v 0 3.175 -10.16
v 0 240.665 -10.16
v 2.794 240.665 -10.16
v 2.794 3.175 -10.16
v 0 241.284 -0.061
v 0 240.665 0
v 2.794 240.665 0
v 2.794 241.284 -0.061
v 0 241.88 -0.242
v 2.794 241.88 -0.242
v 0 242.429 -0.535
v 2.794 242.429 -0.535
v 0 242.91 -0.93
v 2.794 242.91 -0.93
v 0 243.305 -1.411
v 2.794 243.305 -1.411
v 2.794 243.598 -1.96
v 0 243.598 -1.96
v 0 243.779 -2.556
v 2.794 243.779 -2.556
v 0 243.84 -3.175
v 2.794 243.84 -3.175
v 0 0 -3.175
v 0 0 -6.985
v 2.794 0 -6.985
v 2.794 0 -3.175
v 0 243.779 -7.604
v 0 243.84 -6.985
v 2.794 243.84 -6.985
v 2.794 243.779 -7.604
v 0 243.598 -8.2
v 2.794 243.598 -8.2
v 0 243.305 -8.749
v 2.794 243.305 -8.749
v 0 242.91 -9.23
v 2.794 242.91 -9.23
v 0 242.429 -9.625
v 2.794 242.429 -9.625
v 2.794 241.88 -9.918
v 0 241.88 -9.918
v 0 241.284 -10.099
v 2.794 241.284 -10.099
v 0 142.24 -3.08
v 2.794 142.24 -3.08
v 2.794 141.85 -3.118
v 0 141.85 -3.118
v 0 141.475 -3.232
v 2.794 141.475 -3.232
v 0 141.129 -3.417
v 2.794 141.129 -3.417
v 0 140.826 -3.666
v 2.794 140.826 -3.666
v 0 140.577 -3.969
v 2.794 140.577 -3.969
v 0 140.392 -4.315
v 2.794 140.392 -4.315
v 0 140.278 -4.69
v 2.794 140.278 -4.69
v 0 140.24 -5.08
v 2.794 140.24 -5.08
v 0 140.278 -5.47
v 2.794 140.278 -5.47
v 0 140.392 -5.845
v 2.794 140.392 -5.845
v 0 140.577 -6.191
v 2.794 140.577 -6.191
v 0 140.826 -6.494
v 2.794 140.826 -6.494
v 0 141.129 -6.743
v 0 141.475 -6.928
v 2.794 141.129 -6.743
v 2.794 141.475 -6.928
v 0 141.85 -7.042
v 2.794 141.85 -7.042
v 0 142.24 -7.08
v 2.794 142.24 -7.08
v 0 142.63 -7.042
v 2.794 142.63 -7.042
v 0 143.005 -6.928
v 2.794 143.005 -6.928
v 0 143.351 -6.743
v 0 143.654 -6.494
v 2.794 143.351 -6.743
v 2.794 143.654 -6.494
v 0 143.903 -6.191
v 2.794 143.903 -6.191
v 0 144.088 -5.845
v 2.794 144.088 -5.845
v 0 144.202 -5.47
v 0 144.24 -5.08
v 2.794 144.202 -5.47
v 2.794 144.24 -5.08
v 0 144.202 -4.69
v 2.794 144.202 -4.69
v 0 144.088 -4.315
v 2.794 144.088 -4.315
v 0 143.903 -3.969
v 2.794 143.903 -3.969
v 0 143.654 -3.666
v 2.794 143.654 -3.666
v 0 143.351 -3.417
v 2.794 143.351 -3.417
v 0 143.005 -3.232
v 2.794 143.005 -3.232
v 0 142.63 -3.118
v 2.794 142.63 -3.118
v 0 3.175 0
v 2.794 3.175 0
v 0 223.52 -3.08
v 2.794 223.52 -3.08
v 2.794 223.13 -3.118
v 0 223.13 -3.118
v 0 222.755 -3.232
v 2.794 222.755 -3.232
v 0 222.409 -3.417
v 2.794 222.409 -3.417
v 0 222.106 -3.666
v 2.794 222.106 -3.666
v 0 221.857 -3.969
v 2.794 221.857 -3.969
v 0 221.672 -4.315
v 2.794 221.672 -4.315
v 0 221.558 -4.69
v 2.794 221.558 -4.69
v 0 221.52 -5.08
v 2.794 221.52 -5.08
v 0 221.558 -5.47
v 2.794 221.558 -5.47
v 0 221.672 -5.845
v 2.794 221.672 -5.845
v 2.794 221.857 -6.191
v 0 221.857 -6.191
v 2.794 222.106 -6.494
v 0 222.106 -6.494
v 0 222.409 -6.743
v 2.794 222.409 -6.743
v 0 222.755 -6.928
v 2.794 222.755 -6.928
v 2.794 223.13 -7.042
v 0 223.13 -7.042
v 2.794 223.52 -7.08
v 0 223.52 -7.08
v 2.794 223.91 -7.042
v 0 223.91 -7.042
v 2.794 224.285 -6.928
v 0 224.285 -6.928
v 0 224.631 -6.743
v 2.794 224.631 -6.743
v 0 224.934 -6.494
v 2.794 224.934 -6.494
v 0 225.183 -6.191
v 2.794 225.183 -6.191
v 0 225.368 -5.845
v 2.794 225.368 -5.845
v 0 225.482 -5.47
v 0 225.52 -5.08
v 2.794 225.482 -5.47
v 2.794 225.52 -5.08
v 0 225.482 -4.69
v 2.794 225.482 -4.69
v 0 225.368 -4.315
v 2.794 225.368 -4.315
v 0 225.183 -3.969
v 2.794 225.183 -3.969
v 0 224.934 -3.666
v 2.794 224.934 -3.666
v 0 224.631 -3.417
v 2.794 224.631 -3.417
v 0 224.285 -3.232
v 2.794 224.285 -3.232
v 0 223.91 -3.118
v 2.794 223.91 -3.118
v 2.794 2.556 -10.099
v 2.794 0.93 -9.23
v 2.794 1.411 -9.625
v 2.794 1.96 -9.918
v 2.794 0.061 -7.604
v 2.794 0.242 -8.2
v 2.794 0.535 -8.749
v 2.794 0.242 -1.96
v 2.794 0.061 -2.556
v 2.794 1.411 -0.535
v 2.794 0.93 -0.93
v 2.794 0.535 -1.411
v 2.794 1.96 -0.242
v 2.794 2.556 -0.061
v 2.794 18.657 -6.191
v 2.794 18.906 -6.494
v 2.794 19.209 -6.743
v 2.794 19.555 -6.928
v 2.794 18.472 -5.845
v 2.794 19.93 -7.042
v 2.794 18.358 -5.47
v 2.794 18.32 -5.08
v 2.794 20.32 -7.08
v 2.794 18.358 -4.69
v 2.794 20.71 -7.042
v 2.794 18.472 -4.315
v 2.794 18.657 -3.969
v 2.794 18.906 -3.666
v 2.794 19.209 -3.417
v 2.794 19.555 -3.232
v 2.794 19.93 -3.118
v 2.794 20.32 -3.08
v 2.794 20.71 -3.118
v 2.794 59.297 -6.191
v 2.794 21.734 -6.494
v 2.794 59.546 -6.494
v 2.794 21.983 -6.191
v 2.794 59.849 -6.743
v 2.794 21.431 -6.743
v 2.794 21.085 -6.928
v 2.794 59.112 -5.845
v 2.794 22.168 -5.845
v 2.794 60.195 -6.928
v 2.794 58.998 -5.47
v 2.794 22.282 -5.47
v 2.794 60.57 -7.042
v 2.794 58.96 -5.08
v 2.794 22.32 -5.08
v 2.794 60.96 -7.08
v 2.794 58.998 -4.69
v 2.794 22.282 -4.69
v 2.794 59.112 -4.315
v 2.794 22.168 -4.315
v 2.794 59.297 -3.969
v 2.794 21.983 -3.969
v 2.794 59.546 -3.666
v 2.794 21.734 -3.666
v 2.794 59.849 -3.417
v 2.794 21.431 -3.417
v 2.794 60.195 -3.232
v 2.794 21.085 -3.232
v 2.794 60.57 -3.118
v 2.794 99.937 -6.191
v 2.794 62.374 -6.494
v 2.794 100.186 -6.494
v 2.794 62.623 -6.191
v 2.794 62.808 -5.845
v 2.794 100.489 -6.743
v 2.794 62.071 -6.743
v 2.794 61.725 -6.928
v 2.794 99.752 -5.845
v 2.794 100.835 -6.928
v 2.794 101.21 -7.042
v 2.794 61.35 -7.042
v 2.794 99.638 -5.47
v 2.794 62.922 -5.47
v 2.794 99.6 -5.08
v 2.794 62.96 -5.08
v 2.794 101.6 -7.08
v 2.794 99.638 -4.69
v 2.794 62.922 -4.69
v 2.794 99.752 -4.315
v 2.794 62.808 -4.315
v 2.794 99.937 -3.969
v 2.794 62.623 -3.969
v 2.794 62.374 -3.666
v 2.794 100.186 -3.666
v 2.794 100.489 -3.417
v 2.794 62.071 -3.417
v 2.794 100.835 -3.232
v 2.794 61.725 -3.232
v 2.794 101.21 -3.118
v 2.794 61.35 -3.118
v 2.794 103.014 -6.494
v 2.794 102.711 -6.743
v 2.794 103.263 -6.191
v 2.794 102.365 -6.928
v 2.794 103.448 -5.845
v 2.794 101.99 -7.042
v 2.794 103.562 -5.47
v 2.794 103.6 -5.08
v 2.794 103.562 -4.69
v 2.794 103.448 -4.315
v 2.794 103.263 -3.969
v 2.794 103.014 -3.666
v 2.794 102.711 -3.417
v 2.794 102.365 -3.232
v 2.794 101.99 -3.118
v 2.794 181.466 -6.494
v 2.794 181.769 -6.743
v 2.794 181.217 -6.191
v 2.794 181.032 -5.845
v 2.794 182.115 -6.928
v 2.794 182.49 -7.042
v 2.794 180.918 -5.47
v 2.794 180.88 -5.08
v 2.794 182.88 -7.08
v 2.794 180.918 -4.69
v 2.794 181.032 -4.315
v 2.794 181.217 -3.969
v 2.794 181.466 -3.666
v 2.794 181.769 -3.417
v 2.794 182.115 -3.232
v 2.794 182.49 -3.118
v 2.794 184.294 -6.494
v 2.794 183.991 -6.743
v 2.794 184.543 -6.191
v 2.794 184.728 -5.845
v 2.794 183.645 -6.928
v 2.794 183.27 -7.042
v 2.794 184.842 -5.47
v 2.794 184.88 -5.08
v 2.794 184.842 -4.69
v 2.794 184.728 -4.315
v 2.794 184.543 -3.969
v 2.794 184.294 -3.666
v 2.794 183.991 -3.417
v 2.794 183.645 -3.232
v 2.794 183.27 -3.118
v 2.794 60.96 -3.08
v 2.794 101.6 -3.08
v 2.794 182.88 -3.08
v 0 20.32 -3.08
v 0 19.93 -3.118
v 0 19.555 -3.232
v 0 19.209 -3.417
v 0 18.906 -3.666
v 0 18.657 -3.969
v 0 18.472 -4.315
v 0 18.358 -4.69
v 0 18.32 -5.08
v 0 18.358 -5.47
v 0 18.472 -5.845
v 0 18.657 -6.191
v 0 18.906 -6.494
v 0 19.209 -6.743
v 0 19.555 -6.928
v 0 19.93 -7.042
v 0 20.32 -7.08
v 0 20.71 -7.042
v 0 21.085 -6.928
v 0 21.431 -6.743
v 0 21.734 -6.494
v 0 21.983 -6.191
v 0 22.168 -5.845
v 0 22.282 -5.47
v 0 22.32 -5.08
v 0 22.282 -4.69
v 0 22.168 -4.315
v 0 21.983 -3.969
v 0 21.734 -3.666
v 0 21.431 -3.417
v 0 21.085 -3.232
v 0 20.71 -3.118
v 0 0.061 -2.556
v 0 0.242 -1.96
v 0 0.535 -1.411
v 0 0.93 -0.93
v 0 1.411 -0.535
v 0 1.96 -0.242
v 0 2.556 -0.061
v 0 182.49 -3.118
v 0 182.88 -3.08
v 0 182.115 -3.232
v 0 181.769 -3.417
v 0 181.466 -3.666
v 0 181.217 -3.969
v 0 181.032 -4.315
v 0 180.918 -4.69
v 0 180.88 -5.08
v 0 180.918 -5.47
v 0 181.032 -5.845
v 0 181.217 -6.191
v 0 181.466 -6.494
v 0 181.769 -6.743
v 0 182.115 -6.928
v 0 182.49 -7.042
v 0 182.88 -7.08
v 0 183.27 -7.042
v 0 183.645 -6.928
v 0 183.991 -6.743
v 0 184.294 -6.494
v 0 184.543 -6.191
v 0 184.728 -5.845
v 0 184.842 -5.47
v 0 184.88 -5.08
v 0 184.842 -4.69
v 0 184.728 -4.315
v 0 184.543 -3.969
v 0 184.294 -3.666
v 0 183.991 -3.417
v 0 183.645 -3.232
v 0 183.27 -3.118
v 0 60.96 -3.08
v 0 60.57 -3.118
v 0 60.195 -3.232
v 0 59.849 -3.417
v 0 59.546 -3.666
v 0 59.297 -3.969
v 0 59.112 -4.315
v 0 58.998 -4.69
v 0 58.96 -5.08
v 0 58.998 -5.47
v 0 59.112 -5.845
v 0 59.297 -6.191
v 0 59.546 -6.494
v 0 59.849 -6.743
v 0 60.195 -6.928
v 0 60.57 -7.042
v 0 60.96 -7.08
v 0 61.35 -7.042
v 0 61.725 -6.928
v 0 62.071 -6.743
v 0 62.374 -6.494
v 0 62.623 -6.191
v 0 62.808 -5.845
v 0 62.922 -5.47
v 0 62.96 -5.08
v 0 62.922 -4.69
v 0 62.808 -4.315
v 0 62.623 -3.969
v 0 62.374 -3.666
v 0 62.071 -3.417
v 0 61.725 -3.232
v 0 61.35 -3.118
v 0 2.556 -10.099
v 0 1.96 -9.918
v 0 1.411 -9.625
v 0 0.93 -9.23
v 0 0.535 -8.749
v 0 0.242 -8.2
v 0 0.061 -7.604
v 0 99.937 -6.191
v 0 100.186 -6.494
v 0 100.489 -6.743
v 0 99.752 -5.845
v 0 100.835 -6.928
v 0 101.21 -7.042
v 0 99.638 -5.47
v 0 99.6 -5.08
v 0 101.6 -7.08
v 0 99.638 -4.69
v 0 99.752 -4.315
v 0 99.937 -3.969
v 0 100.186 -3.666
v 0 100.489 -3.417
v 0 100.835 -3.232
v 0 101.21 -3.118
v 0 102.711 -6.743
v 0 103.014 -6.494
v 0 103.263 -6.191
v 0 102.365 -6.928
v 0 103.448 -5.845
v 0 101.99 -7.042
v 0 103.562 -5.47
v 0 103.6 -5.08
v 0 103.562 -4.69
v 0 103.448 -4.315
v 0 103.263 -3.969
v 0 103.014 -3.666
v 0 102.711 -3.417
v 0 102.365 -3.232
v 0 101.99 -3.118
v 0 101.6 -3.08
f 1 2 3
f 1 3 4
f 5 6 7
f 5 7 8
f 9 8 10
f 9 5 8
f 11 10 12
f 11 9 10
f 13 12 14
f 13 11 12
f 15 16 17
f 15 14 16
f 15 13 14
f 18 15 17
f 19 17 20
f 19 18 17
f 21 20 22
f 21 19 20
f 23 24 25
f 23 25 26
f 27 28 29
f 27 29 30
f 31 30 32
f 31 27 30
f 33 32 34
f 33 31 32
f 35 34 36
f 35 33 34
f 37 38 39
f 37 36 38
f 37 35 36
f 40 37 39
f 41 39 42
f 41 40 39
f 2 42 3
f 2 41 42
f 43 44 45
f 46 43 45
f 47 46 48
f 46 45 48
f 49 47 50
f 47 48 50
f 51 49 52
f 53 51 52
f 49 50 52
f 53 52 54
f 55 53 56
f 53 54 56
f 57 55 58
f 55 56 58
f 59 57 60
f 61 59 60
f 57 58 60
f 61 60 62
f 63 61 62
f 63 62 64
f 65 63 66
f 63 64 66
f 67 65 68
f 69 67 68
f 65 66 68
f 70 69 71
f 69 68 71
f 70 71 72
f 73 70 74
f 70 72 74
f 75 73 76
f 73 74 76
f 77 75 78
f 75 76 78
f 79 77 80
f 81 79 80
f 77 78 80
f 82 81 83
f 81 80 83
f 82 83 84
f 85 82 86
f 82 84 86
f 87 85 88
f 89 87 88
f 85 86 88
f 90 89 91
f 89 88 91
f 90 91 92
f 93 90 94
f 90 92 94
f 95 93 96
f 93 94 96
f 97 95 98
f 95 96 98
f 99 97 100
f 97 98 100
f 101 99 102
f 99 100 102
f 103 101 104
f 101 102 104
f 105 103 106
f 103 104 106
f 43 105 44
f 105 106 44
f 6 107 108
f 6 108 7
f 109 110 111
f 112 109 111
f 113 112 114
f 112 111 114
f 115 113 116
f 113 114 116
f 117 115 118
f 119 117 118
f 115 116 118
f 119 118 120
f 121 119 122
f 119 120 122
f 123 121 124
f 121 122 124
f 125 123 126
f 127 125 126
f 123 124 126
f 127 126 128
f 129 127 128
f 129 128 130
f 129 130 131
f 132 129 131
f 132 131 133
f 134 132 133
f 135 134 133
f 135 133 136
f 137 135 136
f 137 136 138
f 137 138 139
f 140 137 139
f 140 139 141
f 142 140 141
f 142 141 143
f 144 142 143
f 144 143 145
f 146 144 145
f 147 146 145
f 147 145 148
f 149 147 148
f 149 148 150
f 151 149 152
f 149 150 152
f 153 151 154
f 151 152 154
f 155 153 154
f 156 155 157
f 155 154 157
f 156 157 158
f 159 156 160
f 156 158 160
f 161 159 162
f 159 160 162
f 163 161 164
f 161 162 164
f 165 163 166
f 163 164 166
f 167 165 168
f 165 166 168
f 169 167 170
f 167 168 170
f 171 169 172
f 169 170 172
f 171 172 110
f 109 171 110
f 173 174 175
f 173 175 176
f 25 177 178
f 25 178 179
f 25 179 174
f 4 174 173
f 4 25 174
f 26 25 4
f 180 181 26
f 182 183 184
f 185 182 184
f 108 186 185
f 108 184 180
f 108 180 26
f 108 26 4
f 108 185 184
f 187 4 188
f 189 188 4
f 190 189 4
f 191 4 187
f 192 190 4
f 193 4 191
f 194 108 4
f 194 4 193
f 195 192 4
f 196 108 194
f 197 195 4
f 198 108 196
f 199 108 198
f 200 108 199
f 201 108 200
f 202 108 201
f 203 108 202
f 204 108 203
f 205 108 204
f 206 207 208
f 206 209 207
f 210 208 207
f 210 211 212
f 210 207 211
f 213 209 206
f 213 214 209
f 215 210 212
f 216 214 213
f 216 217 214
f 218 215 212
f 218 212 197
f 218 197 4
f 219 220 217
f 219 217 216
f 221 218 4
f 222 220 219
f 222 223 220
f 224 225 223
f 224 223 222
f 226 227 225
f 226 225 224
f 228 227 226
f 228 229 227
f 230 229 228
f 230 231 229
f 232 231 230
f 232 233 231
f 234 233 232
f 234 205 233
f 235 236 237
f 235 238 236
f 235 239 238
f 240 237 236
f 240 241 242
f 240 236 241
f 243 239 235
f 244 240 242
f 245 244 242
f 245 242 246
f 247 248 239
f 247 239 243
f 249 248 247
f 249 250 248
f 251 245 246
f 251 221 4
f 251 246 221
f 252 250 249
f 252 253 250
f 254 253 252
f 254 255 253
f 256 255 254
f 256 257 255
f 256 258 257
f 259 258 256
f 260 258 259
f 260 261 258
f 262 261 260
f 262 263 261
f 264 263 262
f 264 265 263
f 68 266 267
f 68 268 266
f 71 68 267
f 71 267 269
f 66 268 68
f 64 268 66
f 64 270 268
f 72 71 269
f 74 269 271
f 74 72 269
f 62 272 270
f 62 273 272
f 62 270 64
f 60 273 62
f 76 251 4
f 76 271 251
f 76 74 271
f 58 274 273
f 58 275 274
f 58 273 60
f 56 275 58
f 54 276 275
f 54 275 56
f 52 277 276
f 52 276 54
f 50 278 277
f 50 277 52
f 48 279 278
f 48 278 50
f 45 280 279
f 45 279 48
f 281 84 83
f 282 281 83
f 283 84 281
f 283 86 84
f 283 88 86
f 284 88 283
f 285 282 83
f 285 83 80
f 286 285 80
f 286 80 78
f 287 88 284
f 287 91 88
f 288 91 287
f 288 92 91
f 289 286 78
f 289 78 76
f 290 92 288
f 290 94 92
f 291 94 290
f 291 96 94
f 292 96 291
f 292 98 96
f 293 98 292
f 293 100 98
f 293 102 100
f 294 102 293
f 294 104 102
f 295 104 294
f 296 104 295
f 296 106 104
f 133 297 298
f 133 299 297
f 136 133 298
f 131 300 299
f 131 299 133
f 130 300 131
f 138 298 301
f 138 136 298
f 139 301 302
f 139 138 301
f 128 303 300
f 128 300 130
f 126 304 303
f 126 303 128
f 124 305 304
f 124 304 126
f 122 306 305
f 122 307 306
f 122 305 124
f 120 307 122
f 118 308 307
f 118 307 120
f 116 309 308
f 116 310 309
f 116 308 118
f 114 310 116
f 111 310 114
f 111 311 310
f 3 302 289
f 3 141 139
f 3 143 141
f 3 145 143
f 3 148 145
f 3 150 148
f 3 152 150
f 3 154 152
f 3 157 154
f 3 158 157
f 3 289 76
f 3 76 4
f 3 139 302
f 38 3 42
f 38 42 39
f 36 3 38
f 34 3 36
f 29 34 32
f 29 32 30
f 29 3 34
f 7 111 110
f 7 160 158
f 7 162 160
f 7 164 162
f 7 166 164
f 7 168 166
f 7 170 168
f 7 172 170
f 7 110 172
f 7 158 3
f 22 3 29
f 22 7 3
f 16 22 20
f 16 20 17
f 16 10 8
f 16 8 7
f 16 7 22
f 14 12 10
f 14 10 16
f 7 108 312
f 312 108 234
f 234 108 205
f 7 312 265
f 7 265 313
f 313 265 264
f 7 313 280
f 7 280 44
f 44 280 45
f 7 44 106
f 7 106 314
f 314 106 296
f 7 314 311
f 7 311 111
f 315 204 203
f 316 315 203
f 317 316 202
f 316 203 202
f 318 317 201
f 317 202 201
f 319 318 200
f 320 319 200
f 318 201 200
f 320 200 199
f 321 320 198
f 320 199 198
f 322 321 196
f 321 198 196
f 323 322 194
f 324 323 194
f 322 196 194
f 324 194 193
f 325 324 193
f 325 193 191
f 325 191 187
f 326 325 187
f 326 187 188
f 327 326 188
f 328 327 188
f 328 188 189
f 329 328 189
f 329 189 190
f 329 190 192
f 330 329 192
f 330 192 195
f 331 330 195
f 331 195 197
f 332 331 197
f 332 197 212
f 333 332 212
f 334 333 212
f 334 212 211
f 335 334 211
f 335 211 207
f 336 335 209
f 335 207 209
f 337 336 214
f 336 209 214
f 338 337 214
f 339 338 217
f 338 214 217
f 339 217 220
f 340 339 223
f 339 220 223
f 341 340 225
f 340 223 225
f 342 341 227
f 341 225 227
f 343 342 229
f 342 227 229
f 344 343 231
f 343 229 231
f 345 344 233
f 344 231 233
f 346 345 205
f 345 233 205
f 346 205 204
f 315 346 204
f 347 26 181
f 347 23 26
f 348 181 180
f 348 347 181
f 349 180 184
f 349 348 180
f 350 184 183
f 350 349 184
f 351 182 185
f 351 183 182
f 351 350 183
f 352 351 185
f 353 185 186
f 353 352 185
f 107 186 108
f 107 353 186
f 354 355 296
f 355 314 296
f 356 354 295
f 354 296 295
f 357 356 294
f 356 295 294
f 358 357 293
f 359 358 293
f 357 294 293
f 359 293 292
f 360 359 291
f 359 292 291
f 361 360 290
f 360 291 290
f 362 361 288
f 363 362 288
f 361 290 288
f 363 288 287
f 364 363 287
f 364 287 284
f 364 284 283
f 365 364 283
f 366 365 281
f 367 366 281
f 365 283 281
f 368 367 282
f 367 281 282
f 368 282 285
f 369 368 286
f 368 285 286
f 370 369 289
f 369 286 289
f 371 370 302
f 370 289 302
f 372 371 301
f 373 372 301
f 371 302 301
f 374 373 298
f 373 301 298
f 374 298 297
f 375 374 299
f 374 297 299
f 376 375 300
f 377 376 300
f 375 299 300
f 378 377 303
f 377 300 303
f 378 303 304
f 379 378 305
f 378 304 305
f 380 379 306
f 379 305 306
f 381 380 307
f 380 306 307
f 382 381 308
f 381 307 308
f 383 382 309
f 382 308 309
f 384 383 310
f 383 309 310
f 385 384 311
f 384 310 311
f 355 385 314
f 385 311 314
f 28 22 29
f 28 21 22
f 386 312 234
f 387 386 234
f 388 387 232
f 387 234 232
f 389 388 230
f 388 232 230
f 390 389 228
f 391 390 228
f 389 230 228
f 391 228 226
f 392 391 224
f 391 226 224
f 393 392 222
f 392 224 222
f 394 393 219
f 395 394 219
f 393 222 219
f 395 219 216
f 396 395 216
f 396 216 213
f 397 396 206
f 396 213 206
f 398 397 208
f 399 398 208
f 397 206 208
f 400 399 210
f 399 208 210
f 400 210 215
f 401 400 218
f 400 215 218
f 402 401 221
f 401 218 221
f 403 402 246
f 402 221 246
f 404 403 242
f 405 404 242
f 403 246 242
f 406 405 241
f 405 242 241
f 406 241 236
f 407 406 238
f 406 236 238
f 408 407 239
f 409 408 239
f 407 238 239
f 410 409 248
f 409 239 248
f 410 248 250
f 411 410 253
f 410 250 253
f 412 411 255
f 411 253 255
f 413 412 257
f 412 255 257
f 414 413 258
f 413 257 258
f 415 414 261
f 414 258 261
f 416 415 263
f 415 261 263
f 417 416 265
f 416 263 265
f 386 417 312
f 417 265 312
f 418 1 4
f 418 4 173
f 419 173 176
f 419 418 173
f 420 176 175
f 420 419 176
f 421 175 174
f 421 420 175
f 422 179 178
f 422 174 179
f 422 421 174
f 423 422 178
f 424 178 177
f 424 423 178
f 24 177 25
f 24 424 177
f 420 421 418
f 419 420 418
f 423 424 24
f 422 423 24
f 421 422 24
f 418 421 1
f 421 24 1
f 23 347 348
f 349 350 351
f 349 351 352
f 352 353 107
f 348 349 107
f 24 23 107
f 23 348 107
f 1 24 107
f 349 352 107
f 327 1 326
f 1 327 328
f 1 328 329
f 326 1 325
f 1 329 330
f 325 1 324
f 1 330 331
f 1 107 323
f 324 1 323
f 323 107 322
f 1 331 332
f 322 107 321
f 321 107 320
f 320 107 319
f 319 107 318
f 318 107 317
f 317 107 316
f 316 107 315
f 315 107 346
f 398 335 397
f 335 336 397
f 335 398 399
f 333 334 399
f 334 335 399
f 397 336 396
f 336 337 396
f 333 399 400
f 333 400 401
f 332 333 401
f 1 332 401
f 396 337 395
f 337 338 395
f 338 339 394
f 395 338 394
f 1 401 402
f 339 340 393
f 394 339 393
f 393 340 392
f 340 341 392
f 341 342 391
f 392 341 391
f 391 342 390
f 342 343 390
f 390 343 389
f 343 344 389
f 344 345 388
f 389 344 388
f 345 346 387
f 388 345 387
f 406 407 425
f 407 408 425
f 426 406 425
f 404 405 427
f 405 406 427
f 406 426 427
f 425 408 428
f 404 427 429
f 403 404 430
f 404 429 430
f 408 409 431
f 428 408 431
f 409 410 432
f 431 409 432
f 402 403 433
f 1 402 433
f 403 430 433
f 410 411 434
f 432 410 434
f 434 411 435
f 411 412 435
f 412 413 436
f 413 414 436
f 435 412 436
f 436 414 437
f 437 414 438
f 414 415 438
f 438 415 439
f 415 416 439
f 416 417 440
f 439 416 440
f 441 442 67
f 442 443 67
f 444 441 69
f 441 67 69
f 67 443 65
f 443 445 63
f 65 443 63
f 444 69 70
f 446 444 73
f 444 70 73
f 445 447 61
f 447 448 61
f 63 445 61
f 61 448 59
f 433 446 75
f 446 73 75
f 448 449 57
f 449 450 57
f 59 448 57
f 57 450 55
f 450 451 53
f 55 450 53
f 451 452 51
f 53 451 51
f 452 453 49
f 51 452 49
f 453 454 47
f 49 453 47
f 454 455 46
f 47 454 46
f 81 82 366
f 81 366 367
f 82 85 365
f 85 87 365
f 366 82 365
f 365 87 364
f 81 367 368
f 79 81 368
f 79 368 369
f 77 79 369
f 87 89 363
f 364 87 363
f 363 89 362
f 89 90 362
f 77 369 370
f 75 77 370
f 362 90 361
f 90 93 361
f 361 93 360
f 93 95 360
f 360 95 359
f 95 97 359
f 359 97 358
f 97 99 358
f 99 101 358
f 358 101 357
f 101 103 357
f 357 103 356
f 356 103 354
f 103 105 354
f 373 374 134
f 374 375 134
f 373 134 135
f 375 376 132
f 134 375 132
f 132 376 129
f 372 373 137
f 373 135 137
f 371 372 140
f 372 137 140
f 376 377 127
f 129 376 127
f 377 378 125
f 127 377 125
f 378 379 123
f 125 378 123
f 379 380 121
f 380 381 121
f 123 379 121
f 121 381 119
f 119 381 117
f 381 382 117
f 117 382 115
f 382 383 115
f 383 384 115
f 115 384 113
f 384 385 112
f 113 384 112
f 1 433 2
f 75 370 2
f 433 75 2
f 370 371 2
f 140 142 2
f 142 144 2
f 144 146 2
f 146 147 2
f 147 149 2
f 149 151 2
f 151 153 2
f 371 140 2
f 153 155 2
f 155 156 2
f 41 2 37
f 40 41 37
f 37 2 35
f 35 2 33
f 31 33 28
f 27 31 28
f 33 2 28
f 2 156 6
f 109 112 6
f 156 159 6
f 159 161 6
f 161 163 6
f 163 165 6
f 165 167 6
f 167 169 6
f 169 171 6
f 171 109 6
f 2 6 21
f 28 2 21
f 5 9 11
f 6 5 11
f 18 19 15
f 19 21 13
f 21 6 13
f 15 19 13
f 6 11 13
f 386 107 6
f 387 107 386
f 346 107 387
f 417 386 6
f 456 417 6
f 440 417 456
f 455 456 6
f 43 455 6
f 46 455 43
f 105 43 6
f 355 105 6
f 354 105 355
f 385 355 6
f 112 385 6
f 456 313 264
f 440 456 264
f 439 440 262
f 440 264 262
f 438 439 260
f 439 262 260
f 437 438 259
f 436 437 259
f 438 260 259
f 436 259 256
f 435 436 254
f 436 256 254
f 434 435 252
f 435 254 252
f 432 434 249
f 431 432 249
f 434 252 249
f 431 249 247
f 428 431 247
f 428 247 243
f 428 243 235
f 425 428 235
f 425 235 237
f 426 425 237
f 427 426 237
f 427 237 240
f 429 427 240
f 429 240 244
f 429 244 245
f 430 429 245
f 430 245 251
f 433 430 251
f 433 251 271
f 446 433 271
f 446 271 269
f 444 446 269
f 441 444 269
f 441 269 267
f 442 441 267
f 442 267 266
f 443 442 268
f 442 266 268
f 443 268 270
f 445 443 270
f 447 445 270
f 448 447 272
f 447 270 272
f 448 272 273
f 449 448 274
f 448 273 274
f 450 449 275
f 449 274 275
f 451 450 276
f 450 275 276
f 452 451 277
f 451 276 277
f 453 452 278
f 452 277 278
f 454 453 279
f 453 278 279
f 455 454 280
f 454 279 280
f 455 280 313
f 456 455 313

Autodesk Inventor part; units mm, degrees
ref_plane "YZ Plane" through (0, 0, 0) normal (1, 0, 0) x (0, 1, 0)
ref_plane "XZ Plane" through (0, 0, 0) normal (0, 1, 0) x (-1, 0, 0)
ref_plane "XY Plane" through (0, 0, 0) normal (0, 0, 1) x (1, 0, 0)
sketch "Sketch1" plane through (0, 0, 0) normal (1, 0, 0) x (0, 1, 0)
  line L0 (3.175, 0) -> (240.665, 0)
  line L1 (243.84, -3.175) -> (243.84, -6.985)
  line L2 (240.665, -10.16) -> (3.175, -10.16)
  line L3 (0, -6.985) -> (0, -3.175)
  arc A0 (243.84, -3.175) -> (240.665, 0) centre (240.665, -3.175) ccw
  arc A1 (240.665, -10.16) -> (243.84, -6.985) centre (240.665, -6.985) ccw
  arc A2 (3.175, 0) -> (0, -3.175) centre (3.175, -3.175) ccw
  arc A3 (0, -6.985) -> (3.175, -10.16) centre (3.175, -6.985) ccw
  line L4 (0, -5.08) -> (243.84, -5.08) construction
  point P0 (0, 0)
  point P1 (243.84, -10.16)
  point P2 (243.84, 0)
  point P3 (0, -10.16)
  point P4 (20.32, -5.08)
  point P5 (60.96, -5.08)
  point P6 (101.6, -5.08)
  point P7 (142.24, -5.08)
  point P8 (182.88, -5.08)
  point P9 (223.52, -5.08)
  dimension "d0" = 243.84
  dimension "d1" = 10.16
  dimension "d2" = 3.175
  dimension "d3" = 20.32
  dimension "d6" = 40.64
  dimension "d21" = 101.6
extrude "Extrusion1" add sketch "Sketch1" along normal blind 2.794
hole "Hole3" at (0, 20.32, -5.08) at (0, 60.96, -5.08) at (0, 101.6, -5.08) at (0, 142.24, -5.08) at (0, 182.88, -5.08) at (0, 223.52, -5.08) direction (1, 0, 0) diameter 4 end through all
properties part number "ArmSpacer6" material "Polycarbonate, Smoke"
